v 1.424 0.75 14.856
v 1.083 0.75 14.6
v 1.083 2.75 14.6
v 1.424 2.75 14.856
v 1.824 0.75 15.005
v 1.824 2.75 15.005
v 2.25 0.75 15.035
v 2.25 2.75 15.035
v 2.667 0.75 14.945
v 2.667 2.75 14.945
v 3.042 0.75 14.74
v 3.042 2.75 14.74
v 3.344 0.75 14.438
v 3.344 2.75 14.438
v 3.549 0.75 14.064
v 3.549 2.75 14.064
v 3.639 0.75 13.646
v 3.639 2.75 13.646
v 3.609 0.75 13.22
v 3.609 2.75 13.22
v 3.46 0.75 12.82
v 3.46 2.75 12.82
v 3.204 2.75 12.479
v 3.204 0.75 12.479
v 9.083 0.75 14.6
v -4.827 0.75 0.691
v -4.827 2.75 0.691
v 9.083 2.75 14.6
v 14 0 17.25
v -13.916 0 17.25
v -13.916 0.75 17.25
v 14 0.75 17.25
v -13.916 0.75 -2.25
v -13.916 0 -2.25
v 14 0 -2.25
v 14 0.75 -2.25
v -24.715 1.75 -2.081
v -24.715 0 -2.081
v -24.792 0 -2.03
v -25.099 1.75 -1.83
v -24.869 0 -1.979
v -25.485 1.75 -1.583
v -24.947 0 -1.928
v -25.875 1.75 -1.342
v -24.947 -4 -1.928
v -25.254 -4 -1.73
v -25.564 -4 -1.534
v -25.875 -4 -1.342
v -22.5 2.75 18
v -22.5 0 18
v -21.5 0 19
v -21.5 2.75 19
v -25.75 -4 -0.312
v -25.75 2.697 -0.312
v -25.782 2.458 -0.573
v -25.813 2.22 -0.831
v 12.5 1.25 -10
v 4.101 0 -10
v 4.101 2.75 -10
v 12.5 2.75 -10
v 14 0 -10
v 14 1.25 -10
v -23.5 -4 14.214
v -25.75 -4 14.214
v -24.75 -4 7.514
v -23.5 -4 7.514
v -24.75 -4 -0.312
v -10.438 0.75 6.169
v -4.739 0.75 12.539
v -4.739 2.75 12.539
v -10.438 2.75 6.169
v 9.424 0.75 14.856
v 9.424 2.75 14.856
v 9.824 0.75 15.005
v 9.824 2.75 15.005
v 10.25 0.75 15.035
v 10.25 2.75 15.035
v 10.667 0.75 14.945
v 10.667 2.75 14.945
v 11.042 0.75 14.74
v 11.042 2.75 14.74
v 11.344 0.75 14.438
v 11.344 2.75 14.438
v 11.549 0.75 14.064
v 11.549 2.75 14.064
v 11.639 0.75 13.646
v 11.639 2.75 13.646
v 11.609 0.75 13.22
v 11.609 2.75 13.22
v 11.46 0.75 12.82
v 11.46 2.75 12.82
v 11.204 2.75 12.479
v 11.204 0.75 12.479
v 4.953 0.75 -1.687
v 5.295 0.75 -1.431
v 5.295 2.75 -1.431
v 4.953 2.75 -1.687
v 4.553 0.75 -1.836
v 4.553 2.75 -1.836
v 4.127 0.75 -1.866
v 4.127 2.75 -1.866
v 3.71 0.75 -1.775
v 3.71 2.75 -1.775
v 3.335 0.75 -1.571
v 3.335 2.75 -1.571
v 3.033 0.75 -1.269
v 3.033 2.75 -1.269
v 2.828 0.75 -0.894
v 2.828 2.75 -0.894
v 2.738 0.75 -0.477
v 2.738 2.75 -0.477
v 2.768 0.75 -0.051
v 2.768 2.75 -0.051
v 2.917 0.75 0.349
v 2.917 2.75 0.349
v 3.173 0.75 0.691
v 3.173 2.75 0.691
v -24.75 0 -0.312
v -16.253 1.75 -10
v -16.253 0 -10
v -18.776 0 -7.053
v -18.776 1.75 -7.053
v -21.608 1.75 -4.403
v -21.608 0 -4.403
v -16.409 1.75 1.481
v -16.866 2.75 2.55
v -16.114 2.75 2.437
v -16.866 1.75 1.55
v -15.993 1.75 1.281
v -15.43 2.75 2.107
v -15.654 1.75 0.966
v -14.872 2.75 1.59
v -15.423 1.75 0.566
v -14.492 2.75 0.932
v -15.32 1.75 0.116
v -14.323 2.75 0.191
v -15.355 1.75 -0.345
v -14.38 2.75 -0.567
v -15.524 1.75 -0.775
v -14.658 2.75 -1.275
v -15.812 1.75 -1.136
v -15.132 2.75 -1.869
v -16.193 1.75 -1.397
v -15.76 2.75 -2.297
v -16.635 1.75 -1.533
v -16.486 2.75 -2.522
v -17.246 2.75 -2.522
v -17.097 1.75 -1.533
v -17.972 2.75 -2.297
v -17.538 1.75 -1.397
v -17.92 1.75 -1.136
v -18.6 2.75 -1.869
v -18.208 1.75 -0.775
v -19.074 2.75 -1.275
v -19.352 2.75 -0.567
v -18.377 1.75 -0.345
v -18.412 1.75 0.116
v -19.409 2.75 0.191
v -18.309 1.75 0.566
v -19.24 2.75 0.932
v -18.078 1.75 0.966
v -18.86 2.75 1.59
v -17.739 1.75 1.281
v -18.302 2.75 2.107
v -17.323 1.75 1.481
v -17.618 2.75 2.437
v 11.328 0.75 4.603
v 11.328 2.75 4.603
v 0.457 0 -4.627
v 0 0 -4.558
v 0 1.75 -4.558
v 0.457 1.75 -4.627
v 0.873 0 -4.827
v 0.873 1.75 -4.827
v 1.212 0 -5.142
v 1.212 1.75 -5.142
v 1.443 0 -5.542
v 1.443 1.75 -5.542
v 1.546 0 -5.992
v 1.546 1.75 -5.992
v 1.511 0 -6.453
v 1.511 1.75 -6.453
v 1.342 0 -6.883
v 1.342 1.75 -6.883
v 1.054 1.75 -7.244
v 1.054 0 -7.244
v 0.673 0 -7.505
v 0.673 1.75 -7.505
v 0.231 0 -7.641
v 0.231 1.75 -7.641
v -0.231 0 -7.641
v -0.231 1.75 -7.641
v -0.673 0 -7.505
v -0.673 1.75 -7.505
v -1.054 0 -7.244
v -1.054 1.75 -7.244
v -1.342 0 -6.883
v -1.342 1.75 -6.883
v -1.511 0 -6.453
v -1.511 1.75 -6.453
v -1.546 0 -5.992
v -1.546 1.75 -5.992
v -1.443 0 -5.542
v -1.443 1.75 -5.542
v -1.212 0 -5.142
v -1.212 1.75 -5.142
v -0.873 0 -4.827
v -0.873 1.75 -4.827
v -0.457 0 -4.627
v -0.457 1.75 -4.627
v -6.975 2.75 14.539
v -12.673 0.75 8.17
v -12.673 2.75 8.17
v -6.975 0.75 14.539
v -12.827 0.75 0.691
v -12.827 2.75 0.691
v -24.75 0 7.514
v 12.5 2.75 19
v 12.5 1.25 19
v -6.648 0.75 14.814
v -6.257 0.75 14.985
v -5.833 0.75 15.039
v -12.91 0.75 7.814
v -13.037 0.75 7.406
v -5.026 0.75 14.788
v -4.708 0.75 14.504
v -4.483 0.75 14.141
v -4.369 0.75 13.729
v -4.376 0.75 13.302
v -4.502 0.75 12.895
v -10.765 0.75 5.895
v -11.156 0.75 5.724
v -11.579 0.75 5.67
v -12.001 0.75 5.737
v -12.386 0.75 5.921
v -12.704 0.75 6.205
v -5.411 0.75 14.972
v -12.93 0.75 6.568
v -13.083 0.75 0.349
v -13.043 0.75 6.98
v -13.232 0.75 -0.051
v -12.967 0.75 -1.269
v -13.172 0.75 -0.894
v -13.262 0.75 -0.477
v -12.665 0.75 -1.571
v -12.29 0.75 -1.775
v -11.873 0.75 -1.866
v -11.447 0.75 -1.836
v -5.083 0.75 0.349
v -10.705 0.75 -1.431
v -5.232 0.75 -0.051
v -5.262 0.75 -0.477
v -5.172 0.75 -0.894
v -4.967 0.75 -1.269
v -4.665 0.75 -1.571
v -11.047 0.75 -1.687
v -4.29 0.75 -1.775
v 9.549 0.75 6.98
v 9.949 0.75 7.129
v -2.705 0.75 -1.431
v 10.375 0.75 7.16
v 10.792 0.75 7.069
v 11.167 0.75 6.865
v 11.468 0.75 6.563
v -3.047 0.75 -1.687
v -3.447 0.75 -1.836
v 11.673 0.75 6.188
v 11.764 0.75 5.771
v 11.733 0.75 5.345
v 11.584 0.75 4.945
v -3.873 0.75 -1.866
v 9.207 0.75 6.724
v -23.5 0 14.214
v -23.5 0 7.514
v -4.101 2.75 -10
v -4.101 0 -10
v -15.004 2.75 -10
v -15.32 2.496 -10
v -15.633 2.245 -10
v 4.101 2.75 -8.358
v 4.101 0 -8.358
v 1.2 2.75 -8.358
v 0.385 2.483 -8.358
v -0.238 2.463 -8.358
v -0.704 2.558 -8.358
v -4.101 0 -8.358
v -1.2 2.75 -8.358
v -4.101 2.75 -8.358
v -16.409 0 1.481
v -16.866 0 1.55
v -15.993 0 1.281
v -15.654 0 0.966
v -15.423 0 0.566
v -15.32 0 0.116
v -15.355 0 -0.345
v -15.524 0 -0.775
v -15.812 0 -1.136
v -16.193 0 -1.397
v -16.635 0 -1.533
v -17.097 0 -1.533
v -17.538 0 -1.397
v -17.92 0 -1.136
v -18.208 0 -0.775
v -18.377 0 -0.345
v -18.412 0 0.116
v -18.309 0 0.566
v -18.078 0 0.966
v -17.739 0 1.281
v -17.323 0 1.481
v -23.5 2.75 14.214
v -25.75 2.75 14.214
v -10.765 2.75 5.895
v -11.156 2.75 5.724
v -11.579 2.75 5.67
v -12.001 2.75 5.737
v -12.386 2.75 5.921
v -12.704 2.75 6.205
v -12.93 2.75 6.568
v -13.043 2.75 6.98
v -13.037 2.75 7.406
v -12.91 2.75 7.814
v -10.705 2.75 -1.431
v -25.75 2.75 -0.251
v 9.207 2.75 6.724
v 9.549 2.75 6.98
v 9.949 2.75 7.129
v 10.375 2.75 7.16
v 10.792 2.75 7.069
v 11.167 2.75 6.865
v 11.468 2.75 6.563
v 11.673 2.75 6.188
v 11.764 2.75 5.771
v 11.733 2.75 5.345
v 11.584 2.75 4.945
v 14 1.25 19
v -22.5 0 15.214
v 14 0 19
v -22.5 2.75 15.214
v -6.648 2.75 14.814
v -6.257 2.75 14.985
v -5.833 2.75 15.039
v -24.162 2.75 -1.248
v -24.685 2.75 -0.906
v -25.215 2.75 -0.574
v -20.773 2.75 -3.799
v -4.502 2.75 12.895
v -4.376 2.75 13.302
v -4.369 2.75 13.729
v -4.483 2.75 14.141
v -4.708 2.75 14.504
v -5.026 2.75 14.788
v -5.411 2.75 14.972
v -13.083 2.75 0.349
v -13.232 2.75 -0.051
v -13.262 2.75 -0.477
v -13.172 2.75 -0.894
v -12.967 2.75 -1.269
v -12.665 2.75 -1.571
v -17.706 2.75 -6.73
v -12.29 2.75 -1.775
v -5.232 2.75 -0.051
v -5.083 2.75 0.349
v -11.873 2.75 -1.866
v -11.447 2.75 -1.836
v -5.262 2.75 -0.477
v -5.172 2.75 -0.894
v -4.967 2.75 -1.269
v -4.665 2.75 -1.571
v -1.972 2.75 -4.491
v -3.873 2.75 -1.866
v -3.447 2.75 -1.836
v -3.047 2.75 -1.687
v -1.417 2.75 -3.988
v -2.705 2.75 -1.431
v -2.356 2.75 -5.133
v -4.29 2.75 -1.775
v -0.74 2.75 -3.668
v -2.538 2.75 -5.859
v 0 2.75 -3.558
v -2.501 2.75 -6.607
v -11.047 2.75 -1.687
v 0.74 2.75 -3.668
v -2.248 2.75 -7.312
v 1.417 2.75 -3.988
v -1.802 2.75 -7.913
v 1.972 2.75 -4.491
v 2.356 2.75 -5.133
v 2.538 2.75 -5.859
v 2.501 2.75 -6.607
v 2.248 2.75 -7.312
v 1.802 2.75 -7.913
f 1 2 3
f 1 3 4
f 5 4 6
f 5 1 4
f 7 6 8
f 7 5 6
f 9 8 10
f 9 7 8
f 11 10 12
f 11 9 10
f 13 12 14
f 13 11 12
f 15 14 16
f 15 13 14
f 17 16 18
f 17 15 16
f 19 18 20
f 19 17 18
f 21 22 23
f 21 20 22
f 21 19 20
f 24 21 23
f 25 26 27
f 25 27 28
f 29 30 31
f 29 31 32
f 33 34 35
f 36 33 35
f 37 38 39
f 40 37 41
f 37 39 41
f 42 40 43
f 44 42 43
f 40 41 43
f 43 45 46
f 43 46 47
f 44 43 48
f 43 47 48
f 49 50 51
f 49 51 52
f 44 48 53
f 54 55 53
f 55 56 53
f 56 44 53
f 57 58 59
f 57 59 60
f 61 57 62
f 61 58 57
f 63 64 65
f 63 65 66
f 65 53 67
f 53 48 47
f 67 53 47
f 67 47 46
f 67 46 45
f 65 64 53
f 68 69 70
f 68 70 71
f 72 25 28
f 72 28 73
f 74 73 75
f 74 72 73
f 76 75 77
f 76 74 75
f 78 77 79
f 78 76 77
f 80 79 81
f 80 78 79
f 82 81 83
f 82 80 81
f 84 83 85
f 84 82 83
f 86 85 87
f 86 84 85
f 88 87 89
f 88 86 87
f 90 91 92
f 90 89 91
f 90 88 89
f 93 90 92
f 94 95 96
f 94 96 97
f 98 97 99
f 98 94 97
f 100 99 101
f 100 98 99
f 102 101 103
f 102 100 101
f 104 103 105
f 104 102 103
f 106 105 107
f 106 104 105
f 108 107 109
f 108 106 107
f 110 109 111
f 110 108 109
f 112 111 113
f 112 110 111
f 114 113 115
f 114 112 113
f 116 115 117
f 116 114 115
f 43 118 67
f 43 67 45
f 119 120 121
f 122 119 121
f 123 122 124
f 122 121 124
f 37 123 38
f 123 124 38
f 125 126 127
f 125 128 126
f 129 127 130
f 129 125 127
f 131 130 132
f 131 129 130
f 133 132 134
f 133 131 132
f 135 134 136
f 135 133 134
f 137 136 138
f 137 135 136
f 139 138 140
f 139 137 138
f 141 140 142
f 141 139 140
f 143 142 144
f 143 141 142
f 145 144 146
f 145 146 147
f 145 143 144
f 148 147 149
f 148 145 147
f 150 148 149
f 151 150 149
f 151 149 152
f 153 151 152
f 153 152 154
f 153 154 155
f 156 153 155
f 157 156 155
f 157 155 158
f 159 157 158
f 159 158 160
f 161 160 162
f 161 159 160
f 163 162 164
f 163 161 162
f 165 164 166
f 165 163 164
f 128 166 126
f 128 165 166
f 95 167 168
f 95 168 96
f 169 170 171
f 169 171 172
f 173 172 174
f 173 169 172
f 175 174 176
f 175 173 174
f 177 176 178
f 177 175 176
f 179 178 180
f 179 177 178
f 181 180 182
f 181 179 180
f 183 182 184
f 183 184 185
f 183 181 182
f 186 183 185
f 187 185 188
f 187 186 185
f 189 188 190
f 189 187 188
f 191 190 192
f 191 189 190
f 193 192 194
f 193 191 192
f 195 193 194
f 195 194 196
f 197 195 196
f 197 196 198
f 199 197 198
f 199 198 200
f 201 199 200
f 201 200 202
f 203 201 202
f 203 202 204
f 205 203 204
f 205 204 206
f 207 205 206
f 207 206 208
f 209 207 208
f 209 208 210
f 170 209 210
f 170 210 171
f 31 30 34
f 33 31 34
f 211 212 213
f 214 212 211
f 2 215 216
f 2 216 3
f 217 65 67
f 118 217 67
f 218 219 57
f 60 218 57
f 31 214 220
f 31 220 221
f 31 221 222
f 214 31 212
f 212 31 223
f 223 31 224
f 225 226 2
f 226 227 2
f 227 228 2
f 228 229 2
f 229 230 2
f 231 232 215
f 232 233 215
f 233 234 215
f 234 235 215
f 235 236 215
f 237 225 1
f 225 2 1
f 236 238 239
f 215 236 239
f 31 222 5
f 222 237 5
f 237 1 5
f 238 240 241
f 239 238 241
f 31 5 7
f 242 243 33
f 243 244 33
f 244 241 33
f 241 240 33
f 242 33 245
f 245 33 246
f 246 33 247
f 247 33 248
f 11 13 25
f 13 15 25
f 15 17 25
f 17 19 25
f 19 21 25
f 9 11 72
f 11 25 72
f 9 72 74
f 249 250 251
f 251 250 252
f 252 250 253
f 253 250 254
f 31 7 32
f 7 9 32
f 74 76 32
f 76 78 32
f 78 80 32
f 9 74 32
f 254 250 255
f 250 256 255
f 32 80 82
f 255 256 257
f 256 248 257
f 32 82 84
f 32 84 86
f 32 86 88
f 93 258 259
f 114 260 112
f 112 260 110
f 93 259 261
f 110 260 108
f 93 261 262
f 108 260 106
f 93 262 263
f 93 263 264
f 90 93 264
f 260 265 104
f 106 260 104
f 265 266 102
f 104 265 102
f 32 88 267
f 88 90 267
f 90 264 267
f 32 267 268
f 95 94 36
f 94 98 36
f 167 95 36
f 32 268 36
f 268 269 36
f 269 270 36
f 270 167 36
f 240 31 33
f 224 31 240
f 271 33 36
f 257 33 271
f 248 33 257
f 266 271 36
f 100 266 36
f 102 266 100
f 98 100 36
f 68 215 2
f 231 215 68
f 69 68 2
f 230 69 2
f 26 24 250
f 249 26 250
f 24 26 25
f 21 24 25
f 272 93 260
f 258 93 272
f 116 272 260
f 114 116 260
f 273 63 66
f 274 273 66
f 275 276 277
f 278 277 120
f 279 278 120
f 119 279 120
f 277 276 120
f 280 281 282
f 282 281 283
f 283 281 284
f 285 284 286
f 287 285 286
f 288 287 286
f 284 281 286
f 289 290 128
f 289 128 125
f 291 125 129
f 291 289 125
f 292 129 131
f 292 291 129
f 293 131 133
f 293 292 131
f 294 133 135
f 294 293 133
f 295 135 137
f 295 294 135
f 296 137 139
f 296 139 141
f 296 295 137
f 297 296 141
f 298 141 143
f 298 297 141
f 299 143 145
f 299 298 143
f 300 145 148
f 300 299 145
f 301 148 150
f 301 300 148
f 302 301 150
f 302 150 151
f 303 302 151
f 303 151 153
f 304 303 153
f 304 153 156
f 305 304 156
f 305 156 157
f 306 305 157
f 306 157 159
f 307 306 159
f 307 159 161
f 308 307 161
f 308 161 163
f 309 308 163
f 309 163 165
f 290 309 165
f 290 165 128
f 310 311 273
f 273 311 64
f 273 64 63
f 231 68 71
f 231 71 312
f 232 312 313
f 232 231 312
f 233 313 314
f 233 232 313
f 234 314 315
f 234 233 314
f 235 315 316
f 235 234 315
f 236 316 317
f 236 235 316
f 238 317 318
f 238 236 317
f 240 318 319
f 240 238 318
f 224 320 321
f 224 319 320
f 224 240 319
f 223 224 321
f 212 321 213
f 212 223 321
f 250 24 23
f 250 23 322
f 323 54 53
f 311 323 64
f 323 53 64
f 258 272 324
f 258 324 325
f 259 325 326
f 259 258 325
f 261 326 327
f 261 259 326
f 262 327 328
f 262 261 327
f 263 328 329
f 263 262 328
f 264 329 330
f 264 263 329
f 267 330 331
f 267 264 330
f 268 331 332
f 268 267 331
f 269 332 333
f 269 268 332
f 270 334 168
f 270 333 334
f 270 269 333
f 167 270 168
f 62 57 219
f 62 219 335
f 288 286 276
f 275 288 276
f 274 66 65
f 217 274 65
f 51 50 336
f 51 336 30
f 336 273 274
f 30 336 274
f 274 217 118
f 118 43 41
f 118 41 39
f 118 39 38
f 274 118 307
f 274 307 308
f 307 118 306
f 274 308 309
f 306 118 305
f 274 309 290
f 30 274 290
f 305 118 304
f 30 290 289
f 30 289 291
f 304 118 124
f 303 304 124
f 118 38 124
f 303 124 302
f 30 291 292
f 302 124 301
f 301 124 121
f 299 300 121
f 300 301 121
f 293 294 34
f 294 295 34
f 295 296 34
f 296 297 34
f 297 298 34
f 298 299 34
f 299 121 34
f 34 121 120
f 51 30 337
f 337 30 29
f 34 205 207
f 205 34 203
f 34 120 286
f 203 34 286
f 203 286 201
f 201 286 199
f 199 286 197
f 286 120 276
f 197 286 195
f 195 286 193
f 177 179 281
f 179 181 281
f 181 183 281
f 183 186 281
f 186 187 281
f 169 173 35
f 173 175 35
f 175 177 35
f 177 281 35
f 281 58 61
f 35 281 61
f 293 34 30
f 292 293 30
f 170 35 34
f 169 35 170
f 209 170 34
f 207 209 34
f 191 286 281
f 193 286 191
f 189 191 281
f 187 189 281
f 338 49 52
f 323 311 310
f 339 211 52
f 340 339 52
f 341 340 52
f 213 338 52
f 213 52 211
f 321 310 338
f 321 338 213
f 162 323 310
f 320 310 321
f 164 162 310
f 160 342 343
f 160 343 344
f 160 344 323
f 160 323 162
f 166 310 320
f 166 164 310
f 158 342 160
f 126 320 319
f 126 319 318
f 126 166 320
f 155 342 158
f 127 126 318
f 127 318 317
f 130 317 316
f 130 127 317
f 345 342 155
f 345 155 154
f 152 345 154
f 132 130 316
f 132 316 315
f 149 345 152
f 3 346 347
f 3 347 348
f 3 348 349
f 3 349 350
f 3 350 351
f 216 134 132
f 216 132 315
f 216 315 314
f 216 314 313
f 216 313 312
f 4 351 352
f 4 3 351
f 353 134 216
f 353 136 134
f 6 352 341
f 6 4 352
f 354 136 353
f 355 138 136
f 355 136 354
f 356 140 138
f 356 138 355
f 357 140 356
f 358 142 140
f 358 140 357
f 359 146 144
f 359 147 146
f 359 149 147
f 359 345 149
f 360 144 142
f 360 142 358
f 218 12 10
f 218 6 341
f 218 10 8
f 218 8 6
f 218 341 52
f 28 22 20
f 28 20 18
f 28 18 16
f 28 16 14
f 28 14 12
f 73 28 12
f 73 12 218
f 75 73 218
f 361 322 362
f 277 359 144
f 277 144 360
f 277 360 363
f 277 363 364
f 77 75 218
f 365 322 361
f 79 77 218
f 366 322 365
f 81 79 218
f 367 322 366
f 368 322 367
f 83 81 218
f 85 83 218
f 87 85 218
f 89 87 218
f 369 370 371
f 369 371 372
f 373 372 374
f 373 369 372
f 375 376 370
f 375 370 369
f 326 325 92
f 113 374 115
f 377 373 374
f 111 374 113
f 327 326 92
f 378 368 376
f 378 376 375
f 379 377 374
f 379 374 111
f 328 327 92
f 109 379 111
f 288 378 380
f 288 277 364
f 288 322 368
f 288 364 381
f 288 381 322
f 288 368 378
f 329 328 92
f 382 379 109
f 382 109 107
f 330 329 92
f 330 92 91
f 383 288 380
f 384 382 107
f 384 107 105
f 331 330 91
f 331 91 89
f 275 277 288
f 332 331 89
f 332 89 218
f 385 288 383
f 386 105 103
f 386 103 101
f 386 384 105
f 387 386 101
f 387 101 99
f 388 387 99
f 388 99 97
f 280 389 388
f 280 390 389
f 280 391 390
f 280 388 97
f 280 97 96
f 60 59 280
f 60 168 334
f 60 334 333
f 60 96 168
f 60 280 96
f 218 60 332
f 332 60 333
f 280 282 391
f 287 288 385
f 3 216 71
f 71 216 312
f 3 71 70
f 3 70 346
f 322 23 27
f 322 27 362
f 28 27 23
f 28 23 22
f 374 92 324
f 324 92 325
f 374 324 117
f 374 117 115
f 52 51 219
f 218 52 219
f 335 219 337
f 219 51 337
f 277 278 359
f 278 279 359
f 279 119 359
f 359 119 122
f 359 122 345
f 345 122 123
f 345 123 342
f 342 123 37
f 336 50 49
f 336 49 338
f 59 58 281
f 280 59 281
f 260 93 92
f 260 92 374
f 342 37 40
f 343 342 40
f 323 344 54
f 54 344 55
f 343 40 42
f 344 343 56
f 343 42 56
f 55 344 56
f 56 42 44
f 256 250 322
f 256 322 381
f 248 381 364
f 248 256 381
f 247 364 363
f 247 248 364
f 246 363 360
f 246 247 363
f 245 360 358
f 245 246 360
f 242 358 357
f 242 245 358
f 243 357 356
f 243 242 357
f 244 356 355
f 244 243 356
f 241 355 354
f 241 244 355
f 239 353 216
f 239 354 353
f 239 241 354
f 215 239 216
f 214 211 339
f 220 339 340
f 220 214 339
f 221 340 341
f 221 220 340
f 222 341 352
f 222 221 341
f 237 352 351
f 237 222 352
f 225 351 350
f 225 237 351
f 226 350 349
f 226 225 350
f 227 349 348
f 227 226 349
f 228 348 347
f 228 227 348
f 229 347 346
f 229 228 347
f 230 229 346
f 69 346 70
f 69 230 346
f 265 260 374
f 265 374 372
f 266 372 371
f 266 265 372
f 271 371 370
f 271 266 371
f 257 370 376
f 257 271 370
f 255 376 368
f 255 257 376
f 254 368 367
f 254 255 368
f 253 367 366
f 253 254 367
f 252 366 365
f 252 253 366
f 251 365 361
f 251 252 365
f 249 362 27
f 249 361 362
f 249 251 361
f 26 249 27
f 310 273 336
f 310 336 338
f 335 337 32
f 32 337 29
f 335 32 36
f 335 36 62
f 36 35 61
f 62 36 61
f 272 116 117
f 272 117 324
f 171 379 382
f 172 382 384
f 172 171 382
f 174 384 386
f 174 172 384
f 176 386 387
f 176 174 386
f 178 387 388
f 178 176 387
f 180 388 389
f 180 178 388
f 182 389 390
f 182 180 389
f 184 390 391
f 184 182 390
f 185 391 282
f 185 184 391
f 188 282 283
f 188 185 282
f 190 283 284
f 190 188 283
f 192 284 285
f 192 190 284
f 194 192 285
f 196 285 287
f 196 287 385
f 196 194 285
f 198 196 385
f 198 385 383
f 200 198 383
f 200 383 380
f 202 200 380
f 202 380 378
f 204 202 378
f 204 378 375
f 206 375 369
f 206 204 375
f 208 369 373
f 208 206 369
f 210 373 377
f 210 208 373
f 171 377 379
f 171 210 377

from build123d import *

# Parameters (mm, degrees)
SKETCH_221_R           = 1.55
EXTRUDE_926_DEPTH      = 2.75
SKETCH_1005_W          = 35.000000002
SKETCH_1005_H          = 4.75
EXTRUDE_1111_DEPTH     = 2.75
EXTRUDE_1_DEPTH        = 2.75
F_2_PCB_START          = -4
F_2_PCB_DEPTH          = 4
SKETCH_2154_W          = 1.5
SKETCH_2154_H          = 28.99988509
EXTRUDE_2226_DEPTH     = 1.25
SKETCH_2278_W          = 27.915979255
SKETCH_2278_H          = 19.5
PCB_DEPTH              = 0.75
CUT_EXTRUDE_2_DEPTH    = 33.451352798
CHAMFER_1_SIZE         = 1
CHAMFER_2_SIZE         = 1
CUT_EXTRUDE_3375_DEPTH = 4


with BuildPart() as part:
    # Sketch 221 → Extrude 926 (new body)
    with BuildSketch(Plane(origin=(0, 0, 0), x_dir=(1, 0, 0), z_dir=(0, 1, 0))):
        with BuildLine():
            ThreePointArc((-16.252981126, 10), (-20.15501929, 5.688743466), (-24.715186194, 2.08073674))
            Line((-24.715186194, 2.08073674), (-24.500000002, 0.312480077))
            Line((-24.500000002, 0.312480077), (-24.500000002, -7.263629174))
            Line((-24.500000002, -7.263629174), (-22.500000002, -7.263629174))
            Line((-22.500000002, -7.263629174), (-22.500000002, -14.24988509))
            Line((-22.500000002, -14.24988509), (12.5, -14.24988509))
            Line((12.5, -14.24988509), (12.5, 10))
            Line((12.5, 10), (4.100927374, 10))
            Line((4.100927374, 10), (4.100927374, 8.35804307))
            Line((4.100927374, 8.35804307), (-4.100927378, 8.35804307))
            Line((-4.100927378, 8.35804307), (-4.100927378, 10))
            Line((-4.100927378, 10), (-16.252981126, 10))
        make_face()
        with Locations(Location((-16.865979255, 0, 0), (0, 0, 270))):
            Circle(SKETCH_221_R, mode=Mode.SUBTRACT)
        with Locations(Location((-2e-09, 6.108043073, 0), (0, 0, 270))):
            Circle(SKETCH_221_R, mode=Mode.SUBTRACT)
    extrude(amount=EXTRUDE_926_DEPTH)

    # Sketch 1005 → Extrude 1111 (add)
    with BuildSketch(Plane(origin=(0, 0, 0), x_dir=(1, 0, 0), z_dir=(0, 1, 0))):
        with Locations((-5.000000001, -16.62488509)):
            Rectangle(SKETCH_1005_W, SKETCH_1005_H)
    extrude(amount=EXTRUDE_1111_DEPTH)

    # Sketch 1191 → 卡榫结构-1 (add)
    with BuildSketch(Plane(origin=(0, 0, 0), x_dir=(1, 0, 0), z_dir=(0, 1, 0))):
        with BuildLine():
            Line((-25.750000002, -14.213629174), (-22.500000002, -14.213629174))
            Line((-22.500000002, -14.213629174), (-22.500000002, -7.263629174))
            Line((-22.500000002, -7.263629174), (-24.500000002, -7.263629174))
            Line((-24.500000002, -7.263629174), (-24.500000002, 0.312480077))
            Line((-24.500000002, 0.312480077), (-24.715186194, 2.08073674))
            ThreePointArc((-24.715186194, 2.08073674), (-25.291636518, 1.705823535), (-25.875319612, 1.342273079))
            Line((-25.875319612, 1.342273079), (-25.750000002, 0.312480077))
            Line((-25.750000002, 0.312480077), (-25.750000002, -14.213629174))
        make_face()
    extrude(amount=EXTRUDE_1_DEPTH)

    # 草图5<4> → 卡榫结构-2-注意PCB凸出部分 (add)
    with BuildSketch(Plane(origin=(0, 0, 0), x_dir=(1, 0, 0), z_dir=(0, 1, 0)).offset(F_2_PCB_START)):
        with BuildLine():
            Line((-25.750000002, -14.213629174), (-23.500000002, -14.213629174))
            Line((-23.500000002, -14.213629174), (-23.500000002, -7.263629174))
            Line((-23.500000002, -7.263629174), (-24.500000002, -7.263629174))
            Line((-24.500000002, -7.263629174), (-24.500000002, 0.312480077))
            Line((-24.500000002, 0.312480077), (-24.715186194, 2.08073674))
            ThreePointArc((-24.715186194, 2.08073674), (-25.291636518, 1.705823535), (-25.875319612, 1.342273079))
            Line((-25.875319612, 1.342273079), (-25.750000002, 0.312480077))
            Line((-25.750000002, 0.312480077), (-25.750000002, -14.213629174))
        make_face()
    extrude(amount=F_2_PCB_DEPTH)

    # Sketch 2154 → Extrude 2226 (add)
    with BuildSketch(Plane(origin=(0, 0, 0), x_dir=(1, 0, 0), z_dir=(0, 1, 0))):
        with Locations((13.25, -4.499942545)):
            Rectangle(SKETCH_2154_W, SKETCH_2154_H)
    extrude(amount=EXTRUDE_2226_DEPTH)

    # Sketch 2278 → 稳压PCB器件高度补偿 (cut)
    with BuildSketch(Plane(origin=(0, 0, 0), x_dir=(1, 0, 0), z_dir=(0, 1, 0))):
        with Locations((0.042010372, -7.5)):
            Rectangle(SKETCH_2278_W, SKETCH_2278_H)
    extrude(amount=PCB_DEPTH, mode=Mode.SUBTRACT)

    # Sketch 2514 → 切除-拉伸2 (cut, through all)
    with BuildSketch(Plane.XZ.offset(-0.75)):
        with BuildLine():
            Line((3.173198201, 0.69066828), (9.20694903, 6.724419109))
            ThreePointArc((9.20694903, 6.724419109), (11.328269373, 6.724419109), (11.328269373, 4.603098766))
            Line((11.328269373, 4.603098766), (5.294518544, -1.430652063))
            ThreePointArc((5.294518544, -1.430652063), (3.173198201, -1.430652063), (3.173198201, 0.69066828))
        make_face()
        with BuildLine():
            Line((-4.826801799, 0.69066828), (9.08250112, 14.5999712))
            ThreePointArc((9.08250112, 14.5999712), (11.203821464, 14.5999712), (11.203821464, 12.478650856))
            Line((11.203821464, 12.478650856), (-2.705481456, -1.430652063))
            ThreePointArc((-2.705481456, -1.430652063), (-4.826801799, -1.430652063), (-4.826801799, 0.69066828))
        make_face()
        with BuildLine():
            Line((-12.826801799, 0.69066828), (1.08250112, 14.5999712))
            ThreePointArc((1.08250112, 14.5999712), (3.203821464, 14.5999712), (3.203821464, 12.478650856))
            Line((3.203821464, 12.478650856), (-10.705481456, -1.430652063))
            ThreePointArc((-10.705481456, -1.430652063), (-12.826801799, -1.430652063), (-12.826801799, 0.69066828))
        make_face()
        with BuildLine():
            Line((-4.738916917, 12.539185601), (-10.437516852, 6.169395501))
            ThreePointArc((-10.437516852, 6.169395501), (-12.555564069, 6.051599138), (-12.673360433, 8.169646355))
            Line((-12.673360433, 8.169646355), (-6.974760498, 14.539436455))
            ThreePointArc((-6.974760498, 14.539436455), (-4.856713281, 14.657232819), (-4.738916917, 12.539185601))
        make_face()
    extrude(amount=-CUT_EXTRUDE_2_DEPTH, mode=Mode.SUBTRACT)

    # 倒角1
    chamfer_1_edges = [part.edges().sort_by_distance(p)[0] for p in [
        (-20.661675073, 2.75, -5.223818951),
        (-22.500000002, 1.375, 18.99988509),
        (-22.500000002, 1.375, 14.213629174),
    ]]
    chamfer(chamfer_1_edges, length=CHAMFER_1_SIZE)

    # 倒角2
    # the kernel refuses this chamfer: 1 mm, written as the material it takes off along each edge
    with BuildSketch(Plane(origin=(-2e-09, 2.75, -6.108043073), x_dir=(0, 0, 1), z_dir=(-1, 0, 0))) as chamfer_2_piece_1:
        Polygon((1.55 + CHAMFER_2_SIZE, 0), (1.55, -CHAMFER_2_SIZE), (1.55, 0), align=None)
    revolve(axis=Axis((-2e-09, 2.75, -6.108043073), (0, 1, 0)), mode=Mode.SUBTRACT)
    with BuildSketch(Plane(origin=(-16.865979255, 2.75, 0), x_dir=(0, 0, 1), z_dir=(-1, 0, 0))) as chamfer_2_piece_2:
        Polygon((1.55 + CHAMFER_2_SIZE, 0), (1.55, -CHAMFER_2_SIZE), (1.55, 0), align=None)
    revolve(axis=Axis((-16.865979255, 2.75, 0), (0, 1, 0)), mode=Mode.SUBTRACT)

    # 草图1 → Cut-Extrude 3375 (cut)
    with BuildSketch(Plane.XZ.offset(4)):
        with BuildLine():
            Line((-24.715186194, -2.08073674), (-24.500000002, -0.312480077))
            Line((-24.500000002, -0.312480077), (-24.500000002, 7.263629174))
            Line((-24.500000002, 7.263629174), (-23.500000002, 7.263629174))
            Line((-23.500000002, 7.263629174), (-23.500000002, 7.513629174))
            Line((-23.500000002, 7.513629174), (-24.750000002, 7.513629174))
            Line((-24.750000002, 7.513629174), (-24.750000002, -0.312480077))
            Line((-24.750000002, -0.312480077), (-24.946632534, -1.928275128))
            ThreePointArc((-24.946632534, -1.928275128), (-24.830758909, -2.004277534), (-24.715186194, -2.08073674))
        make_face()
    extrude(amount=-CUT_EXTRUDE_3375_DEPTH, mode=Mode.SUBTRACT)


solid = part.part
